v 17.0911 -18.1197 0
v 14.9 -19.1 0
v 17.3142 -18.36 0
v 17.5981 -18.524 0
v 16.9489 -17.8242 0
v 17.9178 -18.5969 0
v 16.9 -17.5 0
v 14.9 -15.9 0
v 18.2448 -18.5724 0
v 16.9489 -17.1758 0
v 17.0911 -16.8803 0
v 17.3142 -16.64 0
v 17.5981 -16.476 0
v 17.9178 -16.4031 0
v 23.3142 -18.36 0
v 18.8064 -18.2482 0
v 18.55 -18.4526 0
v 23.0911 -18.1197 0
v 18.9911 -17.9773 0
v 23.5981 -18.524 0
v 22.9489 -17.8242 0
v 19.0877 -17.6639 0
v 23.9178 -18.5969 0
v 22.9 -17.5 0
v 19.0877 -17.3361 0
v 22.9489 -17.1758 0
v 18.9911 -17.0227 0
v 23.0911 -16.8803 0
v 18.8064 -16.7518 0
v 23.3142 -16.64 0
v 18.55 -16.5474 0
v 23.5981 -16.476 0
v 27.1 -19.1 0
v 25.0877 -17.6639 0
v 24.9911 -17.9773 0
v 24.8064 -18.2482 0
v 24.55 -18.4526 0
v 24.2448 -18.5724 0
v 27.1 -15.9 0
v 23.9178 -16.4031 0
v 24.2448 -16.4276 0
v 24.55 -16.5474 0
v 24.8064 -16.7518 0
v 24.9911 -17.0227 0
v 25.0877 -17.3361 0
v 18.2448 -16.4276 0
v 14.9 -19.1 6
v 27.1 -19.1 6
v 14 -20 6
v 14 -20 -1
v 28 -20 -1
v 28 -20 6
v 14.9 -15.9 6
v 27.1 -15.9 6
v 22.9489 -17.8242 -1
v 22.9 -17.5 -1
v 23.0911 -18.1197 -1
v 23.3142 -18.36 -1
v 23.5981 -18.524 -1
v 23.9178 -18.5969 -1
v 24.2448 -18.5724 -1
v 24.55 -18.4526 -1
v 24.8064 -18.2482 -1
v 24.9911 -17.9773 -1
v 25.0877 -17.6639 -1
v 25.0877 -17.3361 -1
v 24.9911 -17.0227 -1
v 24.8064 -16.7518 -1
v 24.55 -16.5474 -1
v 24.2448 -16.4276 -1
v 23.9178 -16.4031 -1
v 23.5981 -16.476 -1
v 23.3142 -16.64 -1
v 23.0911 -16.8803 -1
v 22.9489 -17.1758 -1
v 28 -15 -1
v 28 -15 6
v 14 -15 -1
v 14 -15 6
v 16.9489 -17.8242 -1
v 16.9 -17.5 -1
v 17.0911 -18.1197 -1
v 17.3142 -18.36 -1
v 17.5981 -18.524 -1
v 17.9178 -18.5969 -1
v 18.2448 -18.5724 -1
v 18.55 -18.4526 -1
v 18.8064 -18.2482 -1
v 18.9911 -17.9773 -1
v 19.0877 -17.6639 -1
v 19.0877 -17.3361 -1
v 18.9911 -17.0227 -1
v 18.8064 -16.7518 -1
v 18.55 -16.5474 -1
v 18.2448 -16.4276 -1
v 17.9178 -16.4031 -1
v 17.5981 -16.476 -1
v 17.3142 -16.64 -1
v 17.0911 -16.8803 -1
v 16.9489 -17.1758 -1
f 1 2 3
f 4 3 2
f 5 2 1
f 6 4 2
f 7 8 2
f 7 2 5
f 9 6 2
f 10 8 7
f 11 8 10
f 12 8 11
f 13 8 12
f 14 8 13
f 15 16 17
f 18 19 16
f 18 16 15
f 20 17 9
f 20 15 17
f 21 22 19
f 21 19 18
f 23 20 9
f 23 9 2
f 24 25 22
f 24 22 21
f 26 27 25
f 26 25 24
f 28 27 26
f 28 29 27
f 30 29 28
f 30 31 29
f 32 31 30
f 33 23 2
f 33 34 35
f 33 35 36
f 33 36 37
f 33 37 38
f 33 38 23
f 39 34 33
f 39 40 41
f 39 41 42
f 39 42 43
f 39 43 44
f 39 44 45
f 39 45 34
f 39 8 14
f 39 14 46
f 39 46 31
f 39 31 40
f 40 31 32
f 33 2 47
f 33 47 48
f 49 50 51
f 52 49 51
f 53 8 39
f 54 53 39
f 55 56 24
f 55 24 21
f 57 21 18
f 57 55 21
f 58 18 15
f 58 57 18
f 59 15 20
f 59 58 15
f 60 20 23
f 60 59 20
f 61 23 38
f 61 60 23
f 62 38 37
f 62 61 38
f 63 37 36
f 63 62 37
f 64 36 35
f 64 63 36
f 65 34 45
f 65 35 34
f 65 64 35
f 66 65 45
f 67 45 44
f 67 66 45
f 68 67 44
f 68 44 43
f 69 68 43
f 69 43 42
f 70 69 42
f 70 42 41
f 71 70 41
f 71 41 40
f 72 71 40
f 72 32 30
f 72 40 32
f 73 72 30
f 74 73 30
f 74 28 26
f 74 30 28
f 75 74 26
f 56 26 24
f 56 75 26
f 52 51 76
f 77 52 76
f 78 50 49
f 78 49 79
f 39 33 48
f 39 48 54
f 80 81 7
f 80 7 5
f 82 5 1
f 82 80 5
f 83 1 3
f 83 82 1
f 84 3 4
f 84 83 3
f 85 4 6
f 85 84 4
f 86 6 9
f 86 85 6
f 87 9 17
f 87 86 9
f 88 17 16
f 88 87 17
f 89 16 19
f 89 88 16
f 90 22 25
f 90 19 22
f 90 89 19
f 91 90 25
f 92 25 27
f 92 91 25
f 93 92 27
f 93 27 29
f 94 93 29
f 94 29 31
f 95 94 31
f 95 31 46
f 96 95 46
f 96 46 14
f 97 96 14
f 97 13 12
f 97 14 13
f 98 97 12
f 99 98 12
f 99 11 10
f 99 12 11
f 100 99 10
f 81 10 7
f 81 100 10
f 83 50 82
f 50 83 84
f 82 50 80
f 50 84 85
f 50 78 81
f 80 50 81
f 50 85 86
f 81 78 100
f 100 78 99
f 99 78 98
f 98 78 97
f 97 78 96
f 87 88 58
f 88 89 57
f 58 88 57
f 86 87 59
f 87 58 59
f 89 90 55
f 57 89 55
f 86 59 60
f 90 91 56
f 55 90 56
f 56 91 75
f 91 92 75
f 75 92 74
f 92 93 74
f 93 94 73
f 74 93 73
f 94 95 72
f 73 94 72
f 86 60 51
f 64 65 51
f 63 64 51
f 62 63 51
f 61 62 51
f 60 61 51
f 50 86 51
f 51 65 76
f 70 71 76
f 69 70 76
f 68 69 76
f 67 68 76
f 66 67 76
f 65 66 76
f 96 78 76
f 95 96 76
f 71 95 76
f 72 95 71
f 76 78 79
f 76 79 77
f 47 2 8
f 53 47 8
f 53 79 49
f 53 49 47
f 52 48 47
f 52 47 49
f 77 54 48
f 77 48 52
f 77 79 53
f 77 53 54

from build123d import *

# Parameters (mm, degrees)
SOFT_CONTACT_AND_WRAP_START     = -1
SOFT_CONTACT_AND_WRAP_PROFILE_W = 14
SOFT_CONTACT_AND_WRAP_PROFILE_H = 5
SOFT_CONTACT_AND_WRAP_DEPTH     = 7
FINGER_SLIP_POCKET_PROFILE_W    = 12.2
FINGER_SLIP_POCKET_PROFILE_H    = 3.2
OPEN_TOP_SLIP_POCKET_DEPTH      = 7
PAD_CAPTURE_M2_START            = -50
PAD_CAPTURE_M2_PROFILE_R        = 1.1
PAD_CAPTURE_M2_DEPTH            = 85.928498393


with BuildPart() as part:
    # Soft_contact_and_wrap_profile → Soft_contact_and_wrap (new body)
    with BuildSketch(Plane.XY.offset(SOFT_CONTACT_AND_WRAP_START)):
        with Locations((21, -17.5)):
            Rectangle(SOFT_CONTACT_AND_WRAP_PROFILE_W, SOFT_CONTACT_AND_WRAP_PROFILE_H)
    extrude(amount=SOFT_CONTACT_AND_WRAP_DEPTH)

    # Finger_slip_pocket_profile → Open_top_slip_pocket (cut)
    with BuildSketch(Plane.XY):
        with Locations((21, -17.5)):
            Rectangle(FINGER_SLIP_POCKET_PROFILE_W, FINGER_SLIP_POCKET_PROFILE_H)
    extrude(amount=OPEN_TOP_SLIP_POCKET_DEPTH, mode=Mode.SUBTRACT)

    # Pad_capture_M2_profile → Pad_capture_M2 (cut, through all)
    with BuildSketch(Plane.XY.offset(PAD_CAPTURE_M2_START)):
        with Locations(Location((18, -17.5, 0), (0, 0, 180))):
            Circle(PAD_CAPTURE_M2_PROFILE_R)
        with Locations(Location((24, -17.5, 0), (0, 0, 180))):
            Circle(PAD_CAPTURE_M2_PROFILE_R)
    extrude(amount=PAD_CAPTURE_M2_DEPTH, mode=Mode.SUBTRACT)


solid = part.part
